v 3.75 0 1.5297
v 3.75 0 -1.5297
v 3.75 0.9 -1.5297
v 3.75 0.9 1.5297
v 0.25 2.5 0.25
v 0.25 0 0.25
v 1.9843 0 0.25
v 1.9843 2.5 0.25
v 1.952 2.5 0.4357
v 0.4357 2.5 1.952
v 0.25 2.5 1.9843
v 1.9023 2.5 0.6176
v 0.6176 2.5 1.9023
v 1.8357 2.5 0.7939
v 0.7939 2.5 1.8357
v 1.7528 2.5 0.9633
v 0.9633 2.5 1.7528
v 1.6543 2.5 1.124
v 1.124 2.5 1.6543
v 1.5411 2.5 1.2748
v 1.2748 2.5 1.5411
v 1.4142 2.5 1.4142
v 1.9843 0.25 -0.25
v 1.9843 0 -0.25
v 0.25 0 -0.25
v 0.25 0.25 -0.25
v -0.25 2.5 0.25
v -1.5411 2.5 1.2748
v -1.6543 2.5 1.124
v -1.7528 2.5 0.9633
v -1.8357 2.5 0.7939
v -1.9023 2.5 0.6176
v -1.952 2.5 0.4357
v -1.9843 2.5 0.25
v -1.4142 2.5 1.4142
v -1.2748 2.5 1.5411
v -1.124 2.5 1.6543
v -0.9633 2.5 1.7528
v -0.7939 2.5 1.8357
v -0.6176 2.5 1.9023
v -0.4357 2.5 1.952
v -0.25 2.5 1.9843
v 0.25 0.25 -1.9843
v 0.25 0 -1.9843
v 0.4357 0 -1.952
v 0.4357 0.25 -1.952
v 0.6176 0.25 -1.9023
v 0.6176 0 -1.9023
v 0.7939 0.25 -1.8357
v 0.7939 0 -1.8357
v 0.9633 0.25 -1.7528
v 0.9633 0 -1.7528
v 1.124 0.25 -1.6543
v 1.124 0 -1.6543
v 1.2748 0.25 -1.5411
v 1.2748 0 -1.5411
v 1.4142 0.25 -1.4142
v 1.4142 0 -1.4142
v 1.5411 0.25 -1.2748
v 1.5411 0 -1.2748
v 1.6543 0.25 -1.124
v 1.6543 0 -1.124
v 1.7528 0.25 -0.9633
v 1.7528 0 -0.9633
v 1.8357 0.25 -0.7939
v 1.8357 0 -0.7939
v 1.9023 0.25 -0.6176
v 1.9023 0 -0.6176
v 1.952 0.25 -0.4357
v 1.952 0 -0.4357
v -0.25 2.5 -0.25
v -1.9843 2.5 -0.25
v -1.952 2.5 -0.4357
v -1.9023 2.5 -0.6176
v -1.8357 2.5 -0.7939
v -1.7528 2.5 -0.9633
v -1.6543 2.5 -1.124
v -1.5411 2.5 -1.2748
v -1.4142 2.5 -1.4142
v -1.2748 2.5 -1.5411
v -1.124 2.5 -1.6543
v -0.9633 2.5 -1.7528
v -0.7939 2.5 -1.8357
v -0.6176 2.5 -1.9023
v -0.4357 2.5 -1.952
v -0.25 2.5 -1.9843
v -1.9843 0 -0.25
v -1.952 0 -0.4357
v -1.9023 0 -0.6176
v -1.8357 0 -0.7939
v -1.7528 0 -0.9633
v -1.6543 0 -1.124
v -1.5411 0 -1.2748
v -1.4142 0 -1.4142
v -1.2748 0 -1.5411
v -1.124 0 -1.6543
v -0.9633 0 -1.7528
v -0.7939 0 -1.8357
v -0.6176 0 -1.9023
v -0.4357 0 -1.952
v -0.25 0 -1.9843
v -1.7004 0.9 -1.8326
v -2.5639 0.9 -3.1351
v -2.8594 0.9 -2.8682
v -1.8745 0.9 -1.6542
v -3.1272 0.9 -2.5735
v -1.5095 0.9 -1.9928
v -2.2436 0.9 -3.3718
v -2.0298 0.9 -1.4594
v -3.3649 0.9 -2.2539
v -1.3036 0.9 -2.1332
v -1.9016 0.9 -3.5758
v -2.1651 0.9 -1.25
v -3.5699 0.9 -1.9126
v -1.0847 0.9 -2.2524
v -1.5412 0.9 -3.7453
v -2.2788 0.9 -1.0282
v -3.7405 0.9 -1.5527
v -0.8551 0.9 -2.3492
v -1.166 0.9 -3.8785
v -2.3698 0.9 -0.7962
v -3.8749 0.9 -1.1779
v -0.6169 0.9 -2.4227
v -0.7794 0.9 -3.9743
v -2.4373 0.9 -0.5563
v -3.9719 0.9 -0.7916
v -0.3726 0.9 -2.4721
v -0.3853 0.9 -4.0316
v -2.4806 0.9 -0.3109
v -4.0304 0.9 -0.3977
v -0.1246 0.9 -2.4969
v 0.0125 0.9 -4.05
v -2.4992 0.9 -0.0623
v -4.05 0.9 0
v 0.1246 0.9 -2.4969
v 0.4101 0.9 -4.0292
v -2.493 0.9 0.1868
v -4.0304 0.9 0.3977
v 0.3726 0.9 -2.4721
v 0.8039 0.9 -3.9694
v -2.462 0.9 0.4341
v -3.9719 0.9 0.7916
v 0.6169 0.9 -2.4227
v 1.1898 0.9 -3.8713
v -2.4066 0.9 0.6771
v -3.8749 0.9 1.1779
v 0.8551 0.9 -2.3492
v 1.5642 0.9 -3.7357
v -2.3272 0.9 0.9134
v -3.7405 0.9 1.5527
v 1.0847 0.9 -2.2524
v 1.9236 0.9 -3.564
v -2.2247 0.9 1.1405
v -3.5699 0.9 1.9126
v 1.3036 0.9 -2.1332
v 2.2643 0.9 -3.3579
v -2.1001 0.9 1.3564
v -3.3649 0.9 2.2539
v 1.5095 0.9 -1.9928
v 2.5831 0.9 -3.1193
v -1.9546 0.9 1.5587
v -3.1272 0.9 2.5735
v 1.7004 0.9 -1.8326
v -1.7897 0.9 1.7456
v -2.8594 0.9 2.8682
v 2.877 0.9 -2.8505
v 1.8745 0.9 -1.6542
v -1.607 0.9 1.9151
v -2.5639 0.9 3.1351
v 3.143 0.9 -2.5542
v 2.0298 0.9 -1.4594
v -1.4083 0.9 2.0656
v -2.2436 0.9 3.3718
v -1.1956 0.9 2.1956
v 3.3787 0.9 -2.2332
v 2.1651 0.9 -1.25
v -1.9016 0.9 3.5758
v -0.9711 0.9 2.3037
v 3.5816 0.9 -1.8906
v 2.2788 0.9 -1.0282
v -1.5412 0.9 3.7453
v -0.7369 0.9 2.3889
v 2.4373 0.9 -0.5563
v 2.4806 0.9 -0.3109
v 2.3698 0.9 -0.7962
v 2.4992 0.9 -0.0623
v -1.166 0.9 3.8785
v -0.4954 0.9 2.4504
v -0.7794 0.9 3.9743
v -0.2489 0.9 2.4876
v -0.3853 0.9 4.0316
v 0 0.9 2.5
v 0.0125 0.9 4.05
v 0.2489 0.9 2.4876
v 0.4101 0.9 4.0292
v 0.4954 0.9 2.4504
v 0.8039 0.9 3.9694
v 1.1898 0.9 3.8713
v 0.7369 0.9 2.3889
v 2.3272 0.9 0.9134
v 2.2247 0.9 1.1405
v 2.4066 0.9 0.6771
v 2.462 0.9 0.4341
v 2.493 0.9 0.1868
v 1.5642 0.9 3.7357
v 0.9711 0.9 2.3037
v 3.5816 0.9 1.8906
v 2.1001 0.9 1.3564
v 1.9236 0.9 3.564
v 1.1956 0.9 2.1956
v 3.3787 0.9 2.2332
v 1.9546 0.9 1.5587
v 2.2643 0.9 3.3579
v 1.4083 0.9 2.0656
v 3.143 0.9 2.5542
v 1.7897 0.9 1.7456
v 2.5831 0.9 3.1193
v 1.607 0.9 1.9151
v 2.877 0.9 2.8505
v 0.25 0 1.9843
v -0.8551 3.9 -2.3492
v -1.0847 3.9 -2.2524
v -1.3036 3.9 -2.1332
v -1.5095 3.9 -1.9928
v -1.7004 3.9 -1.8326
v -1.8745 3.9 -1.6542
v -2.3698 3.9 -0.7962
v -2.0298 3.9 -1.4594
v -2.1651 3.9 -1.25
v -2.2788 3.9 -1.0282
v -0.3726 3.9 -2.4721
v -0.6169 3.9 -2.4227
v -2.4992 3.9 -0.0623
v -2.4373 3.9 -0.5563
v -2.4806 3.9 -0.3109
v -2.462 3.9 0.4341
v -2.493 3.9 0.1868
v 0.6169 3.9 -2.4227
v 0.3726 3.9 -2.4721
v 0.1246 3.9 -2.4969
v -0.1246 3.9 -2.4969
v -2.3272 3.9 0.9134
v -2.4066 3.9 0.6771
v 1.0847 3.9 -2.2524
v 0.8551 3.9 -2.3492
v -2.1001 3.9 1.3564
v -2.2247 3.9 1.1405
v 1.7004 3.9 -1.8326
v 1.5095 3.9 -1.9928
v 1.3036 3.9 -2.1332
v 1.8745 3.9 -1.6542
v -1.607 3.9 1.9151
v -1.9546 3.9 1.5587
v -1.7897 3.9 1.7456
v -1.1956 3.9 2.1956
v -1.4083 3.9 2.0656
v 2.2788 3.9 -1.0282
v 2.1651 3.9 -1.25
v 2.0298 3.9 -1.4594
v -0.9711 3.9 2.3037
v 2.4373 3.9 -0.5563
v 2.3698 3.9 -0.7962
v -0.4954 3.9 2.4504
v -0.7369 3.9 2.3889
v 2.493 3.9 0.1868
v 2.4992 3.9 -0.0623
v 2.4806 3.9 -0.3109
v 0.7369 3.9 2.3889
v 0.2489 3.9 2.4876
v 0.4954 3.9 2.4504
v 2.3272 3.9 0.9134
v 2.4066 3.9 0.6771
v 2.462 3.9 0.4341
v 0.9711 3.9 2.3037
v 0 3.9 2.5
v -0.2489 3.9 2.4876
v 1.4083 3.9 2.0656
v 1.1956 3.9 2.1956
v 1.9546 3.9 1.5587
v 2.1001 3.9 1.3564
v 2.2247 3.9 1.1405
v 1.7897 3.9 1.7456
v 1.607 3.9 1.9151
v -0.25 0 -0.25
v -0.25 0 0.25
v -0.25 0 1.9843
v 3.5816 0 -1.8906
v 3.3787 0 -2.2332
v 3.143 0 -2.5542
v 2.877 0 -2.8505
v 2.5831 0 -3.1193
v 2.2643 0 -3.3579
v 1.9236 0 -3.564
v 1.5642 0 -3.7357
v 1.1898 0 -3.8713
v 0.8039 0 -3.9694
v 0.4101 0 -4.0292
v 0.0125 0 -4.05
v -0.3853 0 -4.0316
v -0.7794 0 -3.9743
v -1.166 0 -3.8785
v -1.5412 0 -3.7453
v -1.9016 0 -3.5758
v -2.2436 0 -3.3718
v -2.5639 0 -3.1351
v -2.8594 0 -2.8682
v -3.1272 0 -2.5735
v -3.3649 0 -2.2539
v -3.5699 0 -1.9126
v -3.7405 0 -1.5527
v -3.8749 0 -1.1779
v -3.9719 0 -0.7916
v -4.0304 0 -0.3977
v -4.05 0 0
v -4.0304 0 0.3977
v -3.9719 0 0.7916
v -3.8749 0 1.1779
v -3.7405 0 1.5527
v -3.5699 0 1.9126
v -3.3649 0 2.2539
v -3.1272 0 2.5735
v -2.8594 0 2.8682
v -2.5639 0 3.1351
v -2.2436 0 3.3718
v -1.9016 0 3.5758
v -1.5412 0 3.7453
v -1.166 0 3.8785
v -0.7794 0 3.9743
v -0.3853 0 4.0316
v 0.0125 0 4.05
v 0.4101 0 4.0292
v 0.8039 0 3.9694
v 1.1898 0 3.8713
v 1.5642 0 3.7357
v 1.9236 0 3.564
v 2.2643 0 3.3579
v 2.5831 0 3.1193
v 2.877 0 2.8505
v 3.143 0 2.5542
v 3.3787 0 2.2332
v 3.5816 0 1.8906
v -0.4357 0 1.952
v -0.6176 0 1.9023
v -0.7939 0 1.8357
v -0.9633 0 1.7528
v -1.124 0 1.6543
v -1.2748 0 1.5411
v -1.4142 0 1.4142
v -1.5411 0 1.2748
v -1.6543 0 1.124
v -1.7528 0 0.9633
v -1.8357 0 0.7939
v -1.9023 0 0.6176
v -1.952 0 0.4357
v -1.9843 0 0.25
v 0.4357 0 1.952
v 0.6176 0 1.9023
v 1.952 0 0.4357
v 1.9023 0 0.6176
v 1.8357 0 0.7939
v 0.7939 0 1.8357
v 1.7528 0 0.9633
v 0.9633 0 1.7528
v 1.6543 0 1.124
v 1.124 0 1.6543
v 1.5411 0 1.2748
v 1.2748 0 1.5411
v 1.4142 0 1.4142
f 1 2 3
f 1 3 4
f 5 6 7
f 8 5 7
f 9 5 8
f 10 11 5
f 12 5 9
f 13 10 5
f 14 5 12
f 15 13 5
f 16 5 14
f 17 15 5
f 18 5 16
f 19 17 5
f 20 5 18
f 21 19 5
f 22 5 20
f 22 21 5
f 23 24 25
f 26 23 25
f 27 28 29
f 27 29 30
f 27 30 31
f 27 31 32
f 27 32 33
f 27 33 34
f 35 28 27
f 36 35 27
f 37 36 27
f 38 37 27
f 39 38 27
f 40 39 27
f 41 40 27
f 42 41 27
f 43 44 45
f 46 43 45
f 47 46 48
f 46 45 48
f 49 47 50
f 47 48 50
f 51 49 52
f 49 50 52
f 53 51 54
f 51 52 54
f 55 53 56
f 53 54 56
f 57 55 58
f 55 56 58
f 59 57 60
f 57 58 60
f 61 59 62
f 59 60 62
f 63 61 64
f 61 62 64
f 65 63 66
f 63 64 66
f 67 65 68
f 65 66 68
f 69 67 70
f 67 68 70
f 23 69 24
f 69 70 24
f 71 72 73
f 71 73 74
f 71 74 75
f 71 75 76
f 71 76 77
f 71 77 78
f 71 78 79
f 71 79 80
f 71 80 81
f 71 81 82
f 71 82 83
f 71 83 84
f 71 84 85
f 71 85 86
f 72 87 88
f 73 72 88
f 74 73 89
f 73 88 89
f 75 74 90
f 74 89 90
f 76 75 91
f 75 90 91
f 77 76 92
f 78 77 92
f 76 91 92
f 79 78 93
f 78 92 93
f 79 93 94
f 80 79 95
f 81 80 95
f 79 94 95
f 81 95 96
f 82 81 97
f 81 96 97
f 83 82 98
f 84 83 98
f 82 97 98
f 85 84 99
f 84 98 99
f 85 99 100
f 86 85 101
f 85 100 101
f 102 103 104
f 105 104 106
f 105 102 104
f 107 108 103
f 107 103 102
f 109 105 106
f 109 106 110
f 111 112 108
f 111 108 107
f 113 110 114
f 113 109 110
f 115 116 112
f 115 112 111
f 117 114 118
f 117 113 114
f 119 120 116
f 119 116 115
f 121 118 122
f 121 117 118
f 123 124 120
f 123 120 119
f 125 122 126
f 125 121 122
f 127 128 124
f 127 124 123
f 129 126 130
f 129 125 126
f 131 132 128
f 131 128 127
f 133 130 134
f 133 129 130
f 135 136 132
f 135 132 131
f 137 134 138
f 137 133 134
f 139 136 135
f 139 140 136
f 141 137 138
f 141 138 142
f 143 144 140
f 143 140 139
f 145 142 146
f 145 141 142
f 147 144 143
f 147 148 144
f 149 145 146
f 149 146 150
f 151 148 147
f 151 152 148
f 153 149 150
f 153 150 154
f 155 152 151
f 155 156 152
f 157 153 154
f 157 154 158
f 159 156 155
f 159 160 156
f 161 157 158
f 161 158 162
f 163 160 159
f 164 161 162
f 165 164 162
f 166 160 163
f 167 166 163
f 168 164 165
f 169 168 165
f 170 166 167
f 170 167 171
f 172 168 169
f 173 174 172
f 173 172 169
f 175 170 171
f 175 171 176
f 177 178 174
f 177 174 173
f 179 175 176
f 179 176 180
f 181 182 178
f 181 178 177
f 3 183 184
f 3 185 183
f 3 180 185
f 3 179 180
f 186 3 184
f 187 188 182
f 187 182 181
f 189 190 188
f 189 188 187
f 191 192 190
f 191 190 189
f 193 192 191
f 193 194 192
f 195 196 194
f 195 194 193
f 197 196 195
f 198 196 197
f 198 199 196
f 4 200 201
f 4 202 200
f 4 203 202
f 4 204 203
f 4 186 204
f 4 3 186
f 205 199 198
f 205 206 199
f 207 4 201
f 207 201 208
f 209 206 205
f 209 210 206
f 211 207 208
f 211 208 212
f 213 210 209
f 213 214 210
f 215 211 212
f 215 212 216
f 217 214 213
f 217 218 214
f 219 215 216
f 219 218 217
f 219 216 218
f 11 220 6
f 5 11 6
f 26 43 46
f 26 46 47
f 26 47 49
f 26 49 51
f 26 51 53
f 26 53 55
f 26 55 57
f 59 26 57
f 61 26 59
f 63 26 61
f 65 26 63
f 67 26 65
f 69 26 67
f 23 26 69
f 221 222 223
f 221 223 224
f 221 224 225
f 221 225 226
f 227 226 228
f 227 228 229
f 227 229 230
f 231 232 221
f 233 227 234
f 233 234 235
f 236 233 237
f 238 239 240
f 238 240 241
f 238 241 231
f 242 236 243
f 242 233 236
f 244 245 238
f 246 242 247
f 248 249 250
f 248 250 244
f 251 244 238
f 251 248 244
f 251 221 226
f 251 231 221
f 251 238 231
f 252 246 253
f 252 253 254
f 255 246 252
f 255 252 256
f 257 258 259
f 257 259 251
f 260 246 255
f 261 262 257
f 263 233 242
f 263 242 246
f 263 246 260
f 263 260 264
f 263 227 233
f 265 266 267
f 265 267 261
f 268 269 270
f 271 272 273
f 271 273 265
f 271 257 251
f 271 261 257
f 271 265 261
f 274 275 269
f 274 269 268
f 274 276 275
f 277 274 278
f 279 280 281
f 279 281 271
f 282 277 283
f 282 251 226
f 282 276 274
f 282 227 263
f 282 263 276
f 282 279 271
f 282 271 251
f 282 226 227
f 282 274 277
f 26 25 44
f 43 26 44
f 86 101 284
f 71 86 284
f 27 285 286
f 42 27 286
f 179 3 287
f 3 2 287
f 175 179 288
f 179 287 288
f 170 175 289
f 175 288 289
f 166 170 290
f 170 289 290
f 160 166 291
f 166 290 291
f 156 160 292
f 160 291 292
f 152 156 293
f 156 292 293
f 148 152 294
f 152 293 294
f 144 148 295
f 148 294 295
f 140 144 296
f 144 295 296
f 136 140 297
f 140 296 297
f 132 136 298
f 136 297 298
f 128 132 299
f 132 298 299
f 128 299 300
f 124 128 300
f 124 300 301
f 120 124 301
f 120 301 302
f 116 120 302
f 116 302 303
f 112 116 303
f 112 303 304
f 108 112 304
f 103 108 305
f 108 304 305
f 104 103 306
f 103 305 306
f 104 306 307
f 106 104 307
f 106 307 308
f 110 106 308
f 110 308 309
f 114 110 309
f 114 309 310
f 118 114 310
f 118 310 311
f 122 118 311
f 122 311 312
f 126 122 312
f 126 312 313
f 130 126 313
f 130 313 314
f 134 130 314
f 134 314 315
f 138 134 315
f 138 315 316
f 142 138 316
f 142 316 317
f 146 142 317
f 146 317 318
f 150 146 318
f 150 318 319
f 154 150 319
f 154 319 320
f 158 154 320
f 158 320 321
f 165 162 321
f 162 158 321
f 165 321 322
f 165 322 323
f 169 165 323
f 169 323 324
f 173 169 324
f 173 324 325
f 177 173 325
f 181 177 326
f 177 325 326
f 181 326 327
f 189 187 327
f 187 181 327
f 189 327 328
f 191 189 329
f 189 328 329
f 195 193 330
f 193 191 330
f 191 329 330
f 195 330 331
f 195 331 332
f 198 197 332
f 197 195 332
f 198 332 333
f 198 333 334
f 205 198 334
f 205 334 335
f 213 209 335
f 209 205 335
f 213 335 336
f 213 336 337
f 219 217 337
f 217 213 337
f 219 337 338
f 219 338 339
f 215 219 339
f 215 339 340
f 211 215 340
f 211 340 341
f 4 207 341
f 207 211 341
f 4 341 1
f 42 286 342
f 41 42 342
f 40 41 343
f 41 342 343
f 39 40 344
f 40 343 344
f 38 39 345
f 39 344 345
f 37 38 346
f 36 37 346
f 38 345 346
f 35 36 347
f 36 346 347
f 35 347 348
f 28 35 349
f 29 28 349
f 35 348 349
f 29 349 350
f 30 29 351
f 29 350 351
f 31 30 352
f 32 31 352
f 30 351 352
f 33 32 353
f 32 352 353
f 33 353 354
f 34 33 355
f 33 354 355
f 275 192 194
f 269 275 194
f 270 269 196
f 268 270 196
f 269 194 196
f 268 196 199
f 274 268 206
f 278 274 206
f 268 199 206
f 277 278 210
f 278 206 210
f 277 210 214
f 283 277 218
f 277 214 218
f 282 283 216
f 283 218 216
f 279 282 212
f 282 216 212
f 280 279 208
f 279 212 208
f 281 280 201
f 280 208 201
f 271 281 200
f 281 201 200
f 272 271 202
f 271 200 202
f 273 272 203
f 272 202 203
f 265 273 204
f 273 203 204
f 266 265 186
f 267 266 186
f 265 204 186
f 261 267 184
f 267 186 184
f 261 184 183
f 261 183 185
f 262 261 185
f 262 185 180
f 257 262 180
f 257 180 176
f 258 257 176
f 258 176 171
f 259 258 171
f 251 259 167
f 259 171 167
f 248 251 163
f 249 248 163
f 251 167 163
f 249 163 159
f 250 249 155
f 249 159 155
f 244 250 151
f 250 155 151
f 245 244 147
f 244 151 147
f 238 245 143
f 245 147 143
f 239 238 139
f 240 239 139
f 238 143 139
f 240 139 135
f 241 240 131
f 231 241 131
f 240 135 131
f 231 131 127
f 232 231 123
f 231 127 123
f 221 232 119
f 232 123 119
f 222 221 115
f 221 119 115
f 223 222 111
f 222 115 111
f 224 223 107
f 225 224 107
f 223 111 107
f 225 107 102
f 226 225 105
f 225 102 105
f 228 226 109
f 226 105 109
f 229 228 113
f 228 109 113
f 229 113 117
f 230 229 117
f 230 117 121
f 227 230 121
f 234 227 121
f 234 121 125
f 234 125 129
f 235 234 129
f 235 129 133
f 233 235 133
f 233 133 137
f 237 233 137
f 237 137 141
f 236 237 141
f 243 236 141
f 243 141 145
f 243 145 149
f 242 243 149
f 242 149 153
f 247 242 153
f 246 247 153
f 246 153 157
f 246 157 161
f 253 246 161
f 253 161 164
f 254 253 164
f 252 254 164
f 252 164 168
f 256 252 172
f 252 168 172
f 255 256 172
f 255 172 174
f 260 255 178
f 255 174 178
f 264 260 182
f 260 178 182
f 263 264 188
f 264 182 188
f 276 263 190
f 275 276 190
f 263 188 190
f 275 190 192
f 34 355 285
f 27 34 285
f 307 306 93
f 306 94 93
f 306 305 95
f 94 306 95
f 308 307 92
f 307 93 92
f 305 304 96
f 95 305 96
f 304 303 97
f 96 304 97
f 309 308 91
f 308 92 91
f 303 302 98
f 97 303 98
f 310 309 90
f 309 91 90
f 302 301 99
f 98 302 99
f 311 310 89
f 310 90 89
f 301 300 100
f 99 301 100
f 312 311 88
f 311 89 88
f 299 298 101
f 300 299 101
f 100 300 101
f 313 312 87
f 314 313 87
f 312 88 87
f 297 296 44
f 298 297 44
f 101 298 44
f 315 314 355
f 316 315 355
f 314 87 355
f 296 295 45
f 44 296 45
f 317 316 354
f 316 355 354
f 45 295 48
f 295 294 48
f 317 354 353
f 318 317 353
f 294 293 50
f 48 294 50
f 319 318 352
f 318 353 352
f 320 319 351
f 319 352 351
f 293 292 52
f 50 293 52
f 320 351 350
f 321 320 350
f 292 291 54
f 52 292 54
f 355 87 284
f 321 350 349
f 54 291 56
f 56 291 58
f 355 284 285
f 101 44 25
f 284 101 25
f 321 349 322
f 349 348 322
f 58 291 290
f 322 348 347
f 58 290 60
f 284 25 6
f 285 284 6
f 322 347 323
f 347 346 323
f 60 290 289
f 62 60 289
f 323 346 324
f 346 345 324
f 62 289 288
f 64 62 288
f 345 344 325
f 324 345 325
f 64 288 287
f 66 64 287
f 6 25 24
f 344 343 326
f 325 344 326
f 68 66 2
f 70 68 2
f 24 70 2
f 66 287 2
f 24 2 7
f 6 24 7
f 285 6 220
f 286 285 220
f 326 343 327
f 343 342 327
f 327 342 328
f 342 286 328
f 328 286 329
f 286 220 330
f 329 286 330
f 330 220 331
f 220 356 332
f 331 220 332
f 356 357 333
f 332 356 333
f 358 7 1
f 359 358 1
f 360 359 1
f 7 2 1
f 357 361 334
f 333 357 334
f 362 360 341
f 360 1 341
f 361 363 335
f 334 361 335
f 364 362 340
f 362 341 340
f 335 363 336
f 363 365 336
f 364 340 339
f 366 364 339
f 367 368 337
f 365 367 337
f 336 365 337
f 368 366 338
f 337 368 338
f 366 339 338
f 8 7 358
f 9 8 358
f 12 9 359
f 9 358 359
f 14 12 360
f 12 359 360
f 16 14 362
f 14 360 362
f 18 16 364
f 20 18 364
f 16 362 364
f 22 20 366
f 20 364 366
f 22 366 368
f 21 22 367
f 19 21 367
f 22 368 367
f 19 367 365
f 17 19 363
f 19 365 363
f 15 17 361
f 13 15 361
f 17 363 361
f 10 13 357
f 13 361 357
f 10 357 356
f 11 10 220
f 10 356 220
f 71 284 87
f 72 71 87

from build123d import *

# Parameters (mm, degrees)
SKETCH1_R           = 4.05
BOSS_EXTRUDE1_DEPTH = 0.9
CUT_EXTRUDE1_START  = -0.9
CUT_EXTRUDE1_DEPTH  = 0.9
SKETCH3_R           = 2.5
BOSS_EXTRUDE2_DEPTH = 3
CUT_EXTRUDE3_DEPTH  = 2.5
CUT_EXTRUDE4_DEPTH  = 0.25


with BuildPart() as part:
    # Sketch1 → Boss-Extrude1 (new body)
    with BuildSketch(Plane(origin=(0, 0, 0), x_dir=(1, 0, 0), z_dir=(0, 1, 0))):
        Circle(SKETCH1_R)
    extrude(amount=BOSS_EXTRUDE1_DEPTH)

    # Sketch2 → Cut-Extrude1 (cut)
    with BuildSketch(Plane(origin=(0, 0.9, 0), x_dir=(1, 0, 0), z_dir=(0, 1, 0)).offset(CUT_EXTRUDE1_START)):
        with BuildLine():
            Line((3.75, 1.529705854), (3.75, 0))
            Line((3.75, 0), (3.75, -1.529705854))
            ThreePointArc((3.75, -1.529705854), (3.97429239, -0.779422863), (4.05, 0))
            ThreePointArc((4.05, 0), (3.97429239, 0.779422863), (3.75, 1.529705854))
        make_face()
    extrude(amount=CUT_EXTRUDE1_DEPTH, mode=Mode.SUBTRACT)

    # Sketch3 → Boss-Extrude2 (add)
    with BuildSketch(Plane(origin=(0, 0.9, 0), x_dir=(1, 0, 0), z_dir=(0, 1, 0))):
        Circle(SKETCH3_R)
    extrude(amount=BOSS_EXTRUDE2_DEPTH)

    # Sketch4 → Cut-Extrude3 (cut)
    with BuildSketch(Plane.XZ):
        with BuildLine():
            Line((-1.984313483, 0.25), (-0.25, 0.25))
            Line((-0.25, 0.25), (-0.25, 1.984313483))
            ThreePointArc((-0.25, 1.984313483), (-1.414213562, 1.414213562), (-1.984313483, 0.25))
        make_face()
        with BuildLine():
            Line((0.25, 1.984313483), (0.25, 0.25))
            Line((0.25, 0.25), (1.984313483, 0.25))
            ThreePointArc((1.984313483, 0.25), (1.414213562, 1.414213562), (0.25, 1.984313483))
        make_face()
        with BuildLine():
            Line((-0.25, -1.984313483), (-0.25, -0.25))
            Line((-0.25, -0.25), (-1.984313483, -0.25))
            ThreePointArc((-1.984313483, -0.25), (-1.414213562, -1.414213562), (-0.25, -1.984313483))
        make_face()
    extrude(amount=-CUT_EXTRUDE3_DEPTH, mode=Mode.SUBTRACT)

    # Sketch4<3> → Cut-Extrude4 (cut)
    with BuildSketch(Plane.XZ):
        with BuildLine():
            Line((1.984313483, -0.25), (0.25, -0.25))
            Line((0.25, -0.25), (0.25, -1.984313483))
            ThreePointArc((0.25, -1.984313483), (1.414213562, -1.414213562), (1.984313483, -0.25))
        make_face()
    extrude(amount=-CUT_EXTRUDE4_DEPTH, mode=Mode.SUBTRACT)


solid = part.part
